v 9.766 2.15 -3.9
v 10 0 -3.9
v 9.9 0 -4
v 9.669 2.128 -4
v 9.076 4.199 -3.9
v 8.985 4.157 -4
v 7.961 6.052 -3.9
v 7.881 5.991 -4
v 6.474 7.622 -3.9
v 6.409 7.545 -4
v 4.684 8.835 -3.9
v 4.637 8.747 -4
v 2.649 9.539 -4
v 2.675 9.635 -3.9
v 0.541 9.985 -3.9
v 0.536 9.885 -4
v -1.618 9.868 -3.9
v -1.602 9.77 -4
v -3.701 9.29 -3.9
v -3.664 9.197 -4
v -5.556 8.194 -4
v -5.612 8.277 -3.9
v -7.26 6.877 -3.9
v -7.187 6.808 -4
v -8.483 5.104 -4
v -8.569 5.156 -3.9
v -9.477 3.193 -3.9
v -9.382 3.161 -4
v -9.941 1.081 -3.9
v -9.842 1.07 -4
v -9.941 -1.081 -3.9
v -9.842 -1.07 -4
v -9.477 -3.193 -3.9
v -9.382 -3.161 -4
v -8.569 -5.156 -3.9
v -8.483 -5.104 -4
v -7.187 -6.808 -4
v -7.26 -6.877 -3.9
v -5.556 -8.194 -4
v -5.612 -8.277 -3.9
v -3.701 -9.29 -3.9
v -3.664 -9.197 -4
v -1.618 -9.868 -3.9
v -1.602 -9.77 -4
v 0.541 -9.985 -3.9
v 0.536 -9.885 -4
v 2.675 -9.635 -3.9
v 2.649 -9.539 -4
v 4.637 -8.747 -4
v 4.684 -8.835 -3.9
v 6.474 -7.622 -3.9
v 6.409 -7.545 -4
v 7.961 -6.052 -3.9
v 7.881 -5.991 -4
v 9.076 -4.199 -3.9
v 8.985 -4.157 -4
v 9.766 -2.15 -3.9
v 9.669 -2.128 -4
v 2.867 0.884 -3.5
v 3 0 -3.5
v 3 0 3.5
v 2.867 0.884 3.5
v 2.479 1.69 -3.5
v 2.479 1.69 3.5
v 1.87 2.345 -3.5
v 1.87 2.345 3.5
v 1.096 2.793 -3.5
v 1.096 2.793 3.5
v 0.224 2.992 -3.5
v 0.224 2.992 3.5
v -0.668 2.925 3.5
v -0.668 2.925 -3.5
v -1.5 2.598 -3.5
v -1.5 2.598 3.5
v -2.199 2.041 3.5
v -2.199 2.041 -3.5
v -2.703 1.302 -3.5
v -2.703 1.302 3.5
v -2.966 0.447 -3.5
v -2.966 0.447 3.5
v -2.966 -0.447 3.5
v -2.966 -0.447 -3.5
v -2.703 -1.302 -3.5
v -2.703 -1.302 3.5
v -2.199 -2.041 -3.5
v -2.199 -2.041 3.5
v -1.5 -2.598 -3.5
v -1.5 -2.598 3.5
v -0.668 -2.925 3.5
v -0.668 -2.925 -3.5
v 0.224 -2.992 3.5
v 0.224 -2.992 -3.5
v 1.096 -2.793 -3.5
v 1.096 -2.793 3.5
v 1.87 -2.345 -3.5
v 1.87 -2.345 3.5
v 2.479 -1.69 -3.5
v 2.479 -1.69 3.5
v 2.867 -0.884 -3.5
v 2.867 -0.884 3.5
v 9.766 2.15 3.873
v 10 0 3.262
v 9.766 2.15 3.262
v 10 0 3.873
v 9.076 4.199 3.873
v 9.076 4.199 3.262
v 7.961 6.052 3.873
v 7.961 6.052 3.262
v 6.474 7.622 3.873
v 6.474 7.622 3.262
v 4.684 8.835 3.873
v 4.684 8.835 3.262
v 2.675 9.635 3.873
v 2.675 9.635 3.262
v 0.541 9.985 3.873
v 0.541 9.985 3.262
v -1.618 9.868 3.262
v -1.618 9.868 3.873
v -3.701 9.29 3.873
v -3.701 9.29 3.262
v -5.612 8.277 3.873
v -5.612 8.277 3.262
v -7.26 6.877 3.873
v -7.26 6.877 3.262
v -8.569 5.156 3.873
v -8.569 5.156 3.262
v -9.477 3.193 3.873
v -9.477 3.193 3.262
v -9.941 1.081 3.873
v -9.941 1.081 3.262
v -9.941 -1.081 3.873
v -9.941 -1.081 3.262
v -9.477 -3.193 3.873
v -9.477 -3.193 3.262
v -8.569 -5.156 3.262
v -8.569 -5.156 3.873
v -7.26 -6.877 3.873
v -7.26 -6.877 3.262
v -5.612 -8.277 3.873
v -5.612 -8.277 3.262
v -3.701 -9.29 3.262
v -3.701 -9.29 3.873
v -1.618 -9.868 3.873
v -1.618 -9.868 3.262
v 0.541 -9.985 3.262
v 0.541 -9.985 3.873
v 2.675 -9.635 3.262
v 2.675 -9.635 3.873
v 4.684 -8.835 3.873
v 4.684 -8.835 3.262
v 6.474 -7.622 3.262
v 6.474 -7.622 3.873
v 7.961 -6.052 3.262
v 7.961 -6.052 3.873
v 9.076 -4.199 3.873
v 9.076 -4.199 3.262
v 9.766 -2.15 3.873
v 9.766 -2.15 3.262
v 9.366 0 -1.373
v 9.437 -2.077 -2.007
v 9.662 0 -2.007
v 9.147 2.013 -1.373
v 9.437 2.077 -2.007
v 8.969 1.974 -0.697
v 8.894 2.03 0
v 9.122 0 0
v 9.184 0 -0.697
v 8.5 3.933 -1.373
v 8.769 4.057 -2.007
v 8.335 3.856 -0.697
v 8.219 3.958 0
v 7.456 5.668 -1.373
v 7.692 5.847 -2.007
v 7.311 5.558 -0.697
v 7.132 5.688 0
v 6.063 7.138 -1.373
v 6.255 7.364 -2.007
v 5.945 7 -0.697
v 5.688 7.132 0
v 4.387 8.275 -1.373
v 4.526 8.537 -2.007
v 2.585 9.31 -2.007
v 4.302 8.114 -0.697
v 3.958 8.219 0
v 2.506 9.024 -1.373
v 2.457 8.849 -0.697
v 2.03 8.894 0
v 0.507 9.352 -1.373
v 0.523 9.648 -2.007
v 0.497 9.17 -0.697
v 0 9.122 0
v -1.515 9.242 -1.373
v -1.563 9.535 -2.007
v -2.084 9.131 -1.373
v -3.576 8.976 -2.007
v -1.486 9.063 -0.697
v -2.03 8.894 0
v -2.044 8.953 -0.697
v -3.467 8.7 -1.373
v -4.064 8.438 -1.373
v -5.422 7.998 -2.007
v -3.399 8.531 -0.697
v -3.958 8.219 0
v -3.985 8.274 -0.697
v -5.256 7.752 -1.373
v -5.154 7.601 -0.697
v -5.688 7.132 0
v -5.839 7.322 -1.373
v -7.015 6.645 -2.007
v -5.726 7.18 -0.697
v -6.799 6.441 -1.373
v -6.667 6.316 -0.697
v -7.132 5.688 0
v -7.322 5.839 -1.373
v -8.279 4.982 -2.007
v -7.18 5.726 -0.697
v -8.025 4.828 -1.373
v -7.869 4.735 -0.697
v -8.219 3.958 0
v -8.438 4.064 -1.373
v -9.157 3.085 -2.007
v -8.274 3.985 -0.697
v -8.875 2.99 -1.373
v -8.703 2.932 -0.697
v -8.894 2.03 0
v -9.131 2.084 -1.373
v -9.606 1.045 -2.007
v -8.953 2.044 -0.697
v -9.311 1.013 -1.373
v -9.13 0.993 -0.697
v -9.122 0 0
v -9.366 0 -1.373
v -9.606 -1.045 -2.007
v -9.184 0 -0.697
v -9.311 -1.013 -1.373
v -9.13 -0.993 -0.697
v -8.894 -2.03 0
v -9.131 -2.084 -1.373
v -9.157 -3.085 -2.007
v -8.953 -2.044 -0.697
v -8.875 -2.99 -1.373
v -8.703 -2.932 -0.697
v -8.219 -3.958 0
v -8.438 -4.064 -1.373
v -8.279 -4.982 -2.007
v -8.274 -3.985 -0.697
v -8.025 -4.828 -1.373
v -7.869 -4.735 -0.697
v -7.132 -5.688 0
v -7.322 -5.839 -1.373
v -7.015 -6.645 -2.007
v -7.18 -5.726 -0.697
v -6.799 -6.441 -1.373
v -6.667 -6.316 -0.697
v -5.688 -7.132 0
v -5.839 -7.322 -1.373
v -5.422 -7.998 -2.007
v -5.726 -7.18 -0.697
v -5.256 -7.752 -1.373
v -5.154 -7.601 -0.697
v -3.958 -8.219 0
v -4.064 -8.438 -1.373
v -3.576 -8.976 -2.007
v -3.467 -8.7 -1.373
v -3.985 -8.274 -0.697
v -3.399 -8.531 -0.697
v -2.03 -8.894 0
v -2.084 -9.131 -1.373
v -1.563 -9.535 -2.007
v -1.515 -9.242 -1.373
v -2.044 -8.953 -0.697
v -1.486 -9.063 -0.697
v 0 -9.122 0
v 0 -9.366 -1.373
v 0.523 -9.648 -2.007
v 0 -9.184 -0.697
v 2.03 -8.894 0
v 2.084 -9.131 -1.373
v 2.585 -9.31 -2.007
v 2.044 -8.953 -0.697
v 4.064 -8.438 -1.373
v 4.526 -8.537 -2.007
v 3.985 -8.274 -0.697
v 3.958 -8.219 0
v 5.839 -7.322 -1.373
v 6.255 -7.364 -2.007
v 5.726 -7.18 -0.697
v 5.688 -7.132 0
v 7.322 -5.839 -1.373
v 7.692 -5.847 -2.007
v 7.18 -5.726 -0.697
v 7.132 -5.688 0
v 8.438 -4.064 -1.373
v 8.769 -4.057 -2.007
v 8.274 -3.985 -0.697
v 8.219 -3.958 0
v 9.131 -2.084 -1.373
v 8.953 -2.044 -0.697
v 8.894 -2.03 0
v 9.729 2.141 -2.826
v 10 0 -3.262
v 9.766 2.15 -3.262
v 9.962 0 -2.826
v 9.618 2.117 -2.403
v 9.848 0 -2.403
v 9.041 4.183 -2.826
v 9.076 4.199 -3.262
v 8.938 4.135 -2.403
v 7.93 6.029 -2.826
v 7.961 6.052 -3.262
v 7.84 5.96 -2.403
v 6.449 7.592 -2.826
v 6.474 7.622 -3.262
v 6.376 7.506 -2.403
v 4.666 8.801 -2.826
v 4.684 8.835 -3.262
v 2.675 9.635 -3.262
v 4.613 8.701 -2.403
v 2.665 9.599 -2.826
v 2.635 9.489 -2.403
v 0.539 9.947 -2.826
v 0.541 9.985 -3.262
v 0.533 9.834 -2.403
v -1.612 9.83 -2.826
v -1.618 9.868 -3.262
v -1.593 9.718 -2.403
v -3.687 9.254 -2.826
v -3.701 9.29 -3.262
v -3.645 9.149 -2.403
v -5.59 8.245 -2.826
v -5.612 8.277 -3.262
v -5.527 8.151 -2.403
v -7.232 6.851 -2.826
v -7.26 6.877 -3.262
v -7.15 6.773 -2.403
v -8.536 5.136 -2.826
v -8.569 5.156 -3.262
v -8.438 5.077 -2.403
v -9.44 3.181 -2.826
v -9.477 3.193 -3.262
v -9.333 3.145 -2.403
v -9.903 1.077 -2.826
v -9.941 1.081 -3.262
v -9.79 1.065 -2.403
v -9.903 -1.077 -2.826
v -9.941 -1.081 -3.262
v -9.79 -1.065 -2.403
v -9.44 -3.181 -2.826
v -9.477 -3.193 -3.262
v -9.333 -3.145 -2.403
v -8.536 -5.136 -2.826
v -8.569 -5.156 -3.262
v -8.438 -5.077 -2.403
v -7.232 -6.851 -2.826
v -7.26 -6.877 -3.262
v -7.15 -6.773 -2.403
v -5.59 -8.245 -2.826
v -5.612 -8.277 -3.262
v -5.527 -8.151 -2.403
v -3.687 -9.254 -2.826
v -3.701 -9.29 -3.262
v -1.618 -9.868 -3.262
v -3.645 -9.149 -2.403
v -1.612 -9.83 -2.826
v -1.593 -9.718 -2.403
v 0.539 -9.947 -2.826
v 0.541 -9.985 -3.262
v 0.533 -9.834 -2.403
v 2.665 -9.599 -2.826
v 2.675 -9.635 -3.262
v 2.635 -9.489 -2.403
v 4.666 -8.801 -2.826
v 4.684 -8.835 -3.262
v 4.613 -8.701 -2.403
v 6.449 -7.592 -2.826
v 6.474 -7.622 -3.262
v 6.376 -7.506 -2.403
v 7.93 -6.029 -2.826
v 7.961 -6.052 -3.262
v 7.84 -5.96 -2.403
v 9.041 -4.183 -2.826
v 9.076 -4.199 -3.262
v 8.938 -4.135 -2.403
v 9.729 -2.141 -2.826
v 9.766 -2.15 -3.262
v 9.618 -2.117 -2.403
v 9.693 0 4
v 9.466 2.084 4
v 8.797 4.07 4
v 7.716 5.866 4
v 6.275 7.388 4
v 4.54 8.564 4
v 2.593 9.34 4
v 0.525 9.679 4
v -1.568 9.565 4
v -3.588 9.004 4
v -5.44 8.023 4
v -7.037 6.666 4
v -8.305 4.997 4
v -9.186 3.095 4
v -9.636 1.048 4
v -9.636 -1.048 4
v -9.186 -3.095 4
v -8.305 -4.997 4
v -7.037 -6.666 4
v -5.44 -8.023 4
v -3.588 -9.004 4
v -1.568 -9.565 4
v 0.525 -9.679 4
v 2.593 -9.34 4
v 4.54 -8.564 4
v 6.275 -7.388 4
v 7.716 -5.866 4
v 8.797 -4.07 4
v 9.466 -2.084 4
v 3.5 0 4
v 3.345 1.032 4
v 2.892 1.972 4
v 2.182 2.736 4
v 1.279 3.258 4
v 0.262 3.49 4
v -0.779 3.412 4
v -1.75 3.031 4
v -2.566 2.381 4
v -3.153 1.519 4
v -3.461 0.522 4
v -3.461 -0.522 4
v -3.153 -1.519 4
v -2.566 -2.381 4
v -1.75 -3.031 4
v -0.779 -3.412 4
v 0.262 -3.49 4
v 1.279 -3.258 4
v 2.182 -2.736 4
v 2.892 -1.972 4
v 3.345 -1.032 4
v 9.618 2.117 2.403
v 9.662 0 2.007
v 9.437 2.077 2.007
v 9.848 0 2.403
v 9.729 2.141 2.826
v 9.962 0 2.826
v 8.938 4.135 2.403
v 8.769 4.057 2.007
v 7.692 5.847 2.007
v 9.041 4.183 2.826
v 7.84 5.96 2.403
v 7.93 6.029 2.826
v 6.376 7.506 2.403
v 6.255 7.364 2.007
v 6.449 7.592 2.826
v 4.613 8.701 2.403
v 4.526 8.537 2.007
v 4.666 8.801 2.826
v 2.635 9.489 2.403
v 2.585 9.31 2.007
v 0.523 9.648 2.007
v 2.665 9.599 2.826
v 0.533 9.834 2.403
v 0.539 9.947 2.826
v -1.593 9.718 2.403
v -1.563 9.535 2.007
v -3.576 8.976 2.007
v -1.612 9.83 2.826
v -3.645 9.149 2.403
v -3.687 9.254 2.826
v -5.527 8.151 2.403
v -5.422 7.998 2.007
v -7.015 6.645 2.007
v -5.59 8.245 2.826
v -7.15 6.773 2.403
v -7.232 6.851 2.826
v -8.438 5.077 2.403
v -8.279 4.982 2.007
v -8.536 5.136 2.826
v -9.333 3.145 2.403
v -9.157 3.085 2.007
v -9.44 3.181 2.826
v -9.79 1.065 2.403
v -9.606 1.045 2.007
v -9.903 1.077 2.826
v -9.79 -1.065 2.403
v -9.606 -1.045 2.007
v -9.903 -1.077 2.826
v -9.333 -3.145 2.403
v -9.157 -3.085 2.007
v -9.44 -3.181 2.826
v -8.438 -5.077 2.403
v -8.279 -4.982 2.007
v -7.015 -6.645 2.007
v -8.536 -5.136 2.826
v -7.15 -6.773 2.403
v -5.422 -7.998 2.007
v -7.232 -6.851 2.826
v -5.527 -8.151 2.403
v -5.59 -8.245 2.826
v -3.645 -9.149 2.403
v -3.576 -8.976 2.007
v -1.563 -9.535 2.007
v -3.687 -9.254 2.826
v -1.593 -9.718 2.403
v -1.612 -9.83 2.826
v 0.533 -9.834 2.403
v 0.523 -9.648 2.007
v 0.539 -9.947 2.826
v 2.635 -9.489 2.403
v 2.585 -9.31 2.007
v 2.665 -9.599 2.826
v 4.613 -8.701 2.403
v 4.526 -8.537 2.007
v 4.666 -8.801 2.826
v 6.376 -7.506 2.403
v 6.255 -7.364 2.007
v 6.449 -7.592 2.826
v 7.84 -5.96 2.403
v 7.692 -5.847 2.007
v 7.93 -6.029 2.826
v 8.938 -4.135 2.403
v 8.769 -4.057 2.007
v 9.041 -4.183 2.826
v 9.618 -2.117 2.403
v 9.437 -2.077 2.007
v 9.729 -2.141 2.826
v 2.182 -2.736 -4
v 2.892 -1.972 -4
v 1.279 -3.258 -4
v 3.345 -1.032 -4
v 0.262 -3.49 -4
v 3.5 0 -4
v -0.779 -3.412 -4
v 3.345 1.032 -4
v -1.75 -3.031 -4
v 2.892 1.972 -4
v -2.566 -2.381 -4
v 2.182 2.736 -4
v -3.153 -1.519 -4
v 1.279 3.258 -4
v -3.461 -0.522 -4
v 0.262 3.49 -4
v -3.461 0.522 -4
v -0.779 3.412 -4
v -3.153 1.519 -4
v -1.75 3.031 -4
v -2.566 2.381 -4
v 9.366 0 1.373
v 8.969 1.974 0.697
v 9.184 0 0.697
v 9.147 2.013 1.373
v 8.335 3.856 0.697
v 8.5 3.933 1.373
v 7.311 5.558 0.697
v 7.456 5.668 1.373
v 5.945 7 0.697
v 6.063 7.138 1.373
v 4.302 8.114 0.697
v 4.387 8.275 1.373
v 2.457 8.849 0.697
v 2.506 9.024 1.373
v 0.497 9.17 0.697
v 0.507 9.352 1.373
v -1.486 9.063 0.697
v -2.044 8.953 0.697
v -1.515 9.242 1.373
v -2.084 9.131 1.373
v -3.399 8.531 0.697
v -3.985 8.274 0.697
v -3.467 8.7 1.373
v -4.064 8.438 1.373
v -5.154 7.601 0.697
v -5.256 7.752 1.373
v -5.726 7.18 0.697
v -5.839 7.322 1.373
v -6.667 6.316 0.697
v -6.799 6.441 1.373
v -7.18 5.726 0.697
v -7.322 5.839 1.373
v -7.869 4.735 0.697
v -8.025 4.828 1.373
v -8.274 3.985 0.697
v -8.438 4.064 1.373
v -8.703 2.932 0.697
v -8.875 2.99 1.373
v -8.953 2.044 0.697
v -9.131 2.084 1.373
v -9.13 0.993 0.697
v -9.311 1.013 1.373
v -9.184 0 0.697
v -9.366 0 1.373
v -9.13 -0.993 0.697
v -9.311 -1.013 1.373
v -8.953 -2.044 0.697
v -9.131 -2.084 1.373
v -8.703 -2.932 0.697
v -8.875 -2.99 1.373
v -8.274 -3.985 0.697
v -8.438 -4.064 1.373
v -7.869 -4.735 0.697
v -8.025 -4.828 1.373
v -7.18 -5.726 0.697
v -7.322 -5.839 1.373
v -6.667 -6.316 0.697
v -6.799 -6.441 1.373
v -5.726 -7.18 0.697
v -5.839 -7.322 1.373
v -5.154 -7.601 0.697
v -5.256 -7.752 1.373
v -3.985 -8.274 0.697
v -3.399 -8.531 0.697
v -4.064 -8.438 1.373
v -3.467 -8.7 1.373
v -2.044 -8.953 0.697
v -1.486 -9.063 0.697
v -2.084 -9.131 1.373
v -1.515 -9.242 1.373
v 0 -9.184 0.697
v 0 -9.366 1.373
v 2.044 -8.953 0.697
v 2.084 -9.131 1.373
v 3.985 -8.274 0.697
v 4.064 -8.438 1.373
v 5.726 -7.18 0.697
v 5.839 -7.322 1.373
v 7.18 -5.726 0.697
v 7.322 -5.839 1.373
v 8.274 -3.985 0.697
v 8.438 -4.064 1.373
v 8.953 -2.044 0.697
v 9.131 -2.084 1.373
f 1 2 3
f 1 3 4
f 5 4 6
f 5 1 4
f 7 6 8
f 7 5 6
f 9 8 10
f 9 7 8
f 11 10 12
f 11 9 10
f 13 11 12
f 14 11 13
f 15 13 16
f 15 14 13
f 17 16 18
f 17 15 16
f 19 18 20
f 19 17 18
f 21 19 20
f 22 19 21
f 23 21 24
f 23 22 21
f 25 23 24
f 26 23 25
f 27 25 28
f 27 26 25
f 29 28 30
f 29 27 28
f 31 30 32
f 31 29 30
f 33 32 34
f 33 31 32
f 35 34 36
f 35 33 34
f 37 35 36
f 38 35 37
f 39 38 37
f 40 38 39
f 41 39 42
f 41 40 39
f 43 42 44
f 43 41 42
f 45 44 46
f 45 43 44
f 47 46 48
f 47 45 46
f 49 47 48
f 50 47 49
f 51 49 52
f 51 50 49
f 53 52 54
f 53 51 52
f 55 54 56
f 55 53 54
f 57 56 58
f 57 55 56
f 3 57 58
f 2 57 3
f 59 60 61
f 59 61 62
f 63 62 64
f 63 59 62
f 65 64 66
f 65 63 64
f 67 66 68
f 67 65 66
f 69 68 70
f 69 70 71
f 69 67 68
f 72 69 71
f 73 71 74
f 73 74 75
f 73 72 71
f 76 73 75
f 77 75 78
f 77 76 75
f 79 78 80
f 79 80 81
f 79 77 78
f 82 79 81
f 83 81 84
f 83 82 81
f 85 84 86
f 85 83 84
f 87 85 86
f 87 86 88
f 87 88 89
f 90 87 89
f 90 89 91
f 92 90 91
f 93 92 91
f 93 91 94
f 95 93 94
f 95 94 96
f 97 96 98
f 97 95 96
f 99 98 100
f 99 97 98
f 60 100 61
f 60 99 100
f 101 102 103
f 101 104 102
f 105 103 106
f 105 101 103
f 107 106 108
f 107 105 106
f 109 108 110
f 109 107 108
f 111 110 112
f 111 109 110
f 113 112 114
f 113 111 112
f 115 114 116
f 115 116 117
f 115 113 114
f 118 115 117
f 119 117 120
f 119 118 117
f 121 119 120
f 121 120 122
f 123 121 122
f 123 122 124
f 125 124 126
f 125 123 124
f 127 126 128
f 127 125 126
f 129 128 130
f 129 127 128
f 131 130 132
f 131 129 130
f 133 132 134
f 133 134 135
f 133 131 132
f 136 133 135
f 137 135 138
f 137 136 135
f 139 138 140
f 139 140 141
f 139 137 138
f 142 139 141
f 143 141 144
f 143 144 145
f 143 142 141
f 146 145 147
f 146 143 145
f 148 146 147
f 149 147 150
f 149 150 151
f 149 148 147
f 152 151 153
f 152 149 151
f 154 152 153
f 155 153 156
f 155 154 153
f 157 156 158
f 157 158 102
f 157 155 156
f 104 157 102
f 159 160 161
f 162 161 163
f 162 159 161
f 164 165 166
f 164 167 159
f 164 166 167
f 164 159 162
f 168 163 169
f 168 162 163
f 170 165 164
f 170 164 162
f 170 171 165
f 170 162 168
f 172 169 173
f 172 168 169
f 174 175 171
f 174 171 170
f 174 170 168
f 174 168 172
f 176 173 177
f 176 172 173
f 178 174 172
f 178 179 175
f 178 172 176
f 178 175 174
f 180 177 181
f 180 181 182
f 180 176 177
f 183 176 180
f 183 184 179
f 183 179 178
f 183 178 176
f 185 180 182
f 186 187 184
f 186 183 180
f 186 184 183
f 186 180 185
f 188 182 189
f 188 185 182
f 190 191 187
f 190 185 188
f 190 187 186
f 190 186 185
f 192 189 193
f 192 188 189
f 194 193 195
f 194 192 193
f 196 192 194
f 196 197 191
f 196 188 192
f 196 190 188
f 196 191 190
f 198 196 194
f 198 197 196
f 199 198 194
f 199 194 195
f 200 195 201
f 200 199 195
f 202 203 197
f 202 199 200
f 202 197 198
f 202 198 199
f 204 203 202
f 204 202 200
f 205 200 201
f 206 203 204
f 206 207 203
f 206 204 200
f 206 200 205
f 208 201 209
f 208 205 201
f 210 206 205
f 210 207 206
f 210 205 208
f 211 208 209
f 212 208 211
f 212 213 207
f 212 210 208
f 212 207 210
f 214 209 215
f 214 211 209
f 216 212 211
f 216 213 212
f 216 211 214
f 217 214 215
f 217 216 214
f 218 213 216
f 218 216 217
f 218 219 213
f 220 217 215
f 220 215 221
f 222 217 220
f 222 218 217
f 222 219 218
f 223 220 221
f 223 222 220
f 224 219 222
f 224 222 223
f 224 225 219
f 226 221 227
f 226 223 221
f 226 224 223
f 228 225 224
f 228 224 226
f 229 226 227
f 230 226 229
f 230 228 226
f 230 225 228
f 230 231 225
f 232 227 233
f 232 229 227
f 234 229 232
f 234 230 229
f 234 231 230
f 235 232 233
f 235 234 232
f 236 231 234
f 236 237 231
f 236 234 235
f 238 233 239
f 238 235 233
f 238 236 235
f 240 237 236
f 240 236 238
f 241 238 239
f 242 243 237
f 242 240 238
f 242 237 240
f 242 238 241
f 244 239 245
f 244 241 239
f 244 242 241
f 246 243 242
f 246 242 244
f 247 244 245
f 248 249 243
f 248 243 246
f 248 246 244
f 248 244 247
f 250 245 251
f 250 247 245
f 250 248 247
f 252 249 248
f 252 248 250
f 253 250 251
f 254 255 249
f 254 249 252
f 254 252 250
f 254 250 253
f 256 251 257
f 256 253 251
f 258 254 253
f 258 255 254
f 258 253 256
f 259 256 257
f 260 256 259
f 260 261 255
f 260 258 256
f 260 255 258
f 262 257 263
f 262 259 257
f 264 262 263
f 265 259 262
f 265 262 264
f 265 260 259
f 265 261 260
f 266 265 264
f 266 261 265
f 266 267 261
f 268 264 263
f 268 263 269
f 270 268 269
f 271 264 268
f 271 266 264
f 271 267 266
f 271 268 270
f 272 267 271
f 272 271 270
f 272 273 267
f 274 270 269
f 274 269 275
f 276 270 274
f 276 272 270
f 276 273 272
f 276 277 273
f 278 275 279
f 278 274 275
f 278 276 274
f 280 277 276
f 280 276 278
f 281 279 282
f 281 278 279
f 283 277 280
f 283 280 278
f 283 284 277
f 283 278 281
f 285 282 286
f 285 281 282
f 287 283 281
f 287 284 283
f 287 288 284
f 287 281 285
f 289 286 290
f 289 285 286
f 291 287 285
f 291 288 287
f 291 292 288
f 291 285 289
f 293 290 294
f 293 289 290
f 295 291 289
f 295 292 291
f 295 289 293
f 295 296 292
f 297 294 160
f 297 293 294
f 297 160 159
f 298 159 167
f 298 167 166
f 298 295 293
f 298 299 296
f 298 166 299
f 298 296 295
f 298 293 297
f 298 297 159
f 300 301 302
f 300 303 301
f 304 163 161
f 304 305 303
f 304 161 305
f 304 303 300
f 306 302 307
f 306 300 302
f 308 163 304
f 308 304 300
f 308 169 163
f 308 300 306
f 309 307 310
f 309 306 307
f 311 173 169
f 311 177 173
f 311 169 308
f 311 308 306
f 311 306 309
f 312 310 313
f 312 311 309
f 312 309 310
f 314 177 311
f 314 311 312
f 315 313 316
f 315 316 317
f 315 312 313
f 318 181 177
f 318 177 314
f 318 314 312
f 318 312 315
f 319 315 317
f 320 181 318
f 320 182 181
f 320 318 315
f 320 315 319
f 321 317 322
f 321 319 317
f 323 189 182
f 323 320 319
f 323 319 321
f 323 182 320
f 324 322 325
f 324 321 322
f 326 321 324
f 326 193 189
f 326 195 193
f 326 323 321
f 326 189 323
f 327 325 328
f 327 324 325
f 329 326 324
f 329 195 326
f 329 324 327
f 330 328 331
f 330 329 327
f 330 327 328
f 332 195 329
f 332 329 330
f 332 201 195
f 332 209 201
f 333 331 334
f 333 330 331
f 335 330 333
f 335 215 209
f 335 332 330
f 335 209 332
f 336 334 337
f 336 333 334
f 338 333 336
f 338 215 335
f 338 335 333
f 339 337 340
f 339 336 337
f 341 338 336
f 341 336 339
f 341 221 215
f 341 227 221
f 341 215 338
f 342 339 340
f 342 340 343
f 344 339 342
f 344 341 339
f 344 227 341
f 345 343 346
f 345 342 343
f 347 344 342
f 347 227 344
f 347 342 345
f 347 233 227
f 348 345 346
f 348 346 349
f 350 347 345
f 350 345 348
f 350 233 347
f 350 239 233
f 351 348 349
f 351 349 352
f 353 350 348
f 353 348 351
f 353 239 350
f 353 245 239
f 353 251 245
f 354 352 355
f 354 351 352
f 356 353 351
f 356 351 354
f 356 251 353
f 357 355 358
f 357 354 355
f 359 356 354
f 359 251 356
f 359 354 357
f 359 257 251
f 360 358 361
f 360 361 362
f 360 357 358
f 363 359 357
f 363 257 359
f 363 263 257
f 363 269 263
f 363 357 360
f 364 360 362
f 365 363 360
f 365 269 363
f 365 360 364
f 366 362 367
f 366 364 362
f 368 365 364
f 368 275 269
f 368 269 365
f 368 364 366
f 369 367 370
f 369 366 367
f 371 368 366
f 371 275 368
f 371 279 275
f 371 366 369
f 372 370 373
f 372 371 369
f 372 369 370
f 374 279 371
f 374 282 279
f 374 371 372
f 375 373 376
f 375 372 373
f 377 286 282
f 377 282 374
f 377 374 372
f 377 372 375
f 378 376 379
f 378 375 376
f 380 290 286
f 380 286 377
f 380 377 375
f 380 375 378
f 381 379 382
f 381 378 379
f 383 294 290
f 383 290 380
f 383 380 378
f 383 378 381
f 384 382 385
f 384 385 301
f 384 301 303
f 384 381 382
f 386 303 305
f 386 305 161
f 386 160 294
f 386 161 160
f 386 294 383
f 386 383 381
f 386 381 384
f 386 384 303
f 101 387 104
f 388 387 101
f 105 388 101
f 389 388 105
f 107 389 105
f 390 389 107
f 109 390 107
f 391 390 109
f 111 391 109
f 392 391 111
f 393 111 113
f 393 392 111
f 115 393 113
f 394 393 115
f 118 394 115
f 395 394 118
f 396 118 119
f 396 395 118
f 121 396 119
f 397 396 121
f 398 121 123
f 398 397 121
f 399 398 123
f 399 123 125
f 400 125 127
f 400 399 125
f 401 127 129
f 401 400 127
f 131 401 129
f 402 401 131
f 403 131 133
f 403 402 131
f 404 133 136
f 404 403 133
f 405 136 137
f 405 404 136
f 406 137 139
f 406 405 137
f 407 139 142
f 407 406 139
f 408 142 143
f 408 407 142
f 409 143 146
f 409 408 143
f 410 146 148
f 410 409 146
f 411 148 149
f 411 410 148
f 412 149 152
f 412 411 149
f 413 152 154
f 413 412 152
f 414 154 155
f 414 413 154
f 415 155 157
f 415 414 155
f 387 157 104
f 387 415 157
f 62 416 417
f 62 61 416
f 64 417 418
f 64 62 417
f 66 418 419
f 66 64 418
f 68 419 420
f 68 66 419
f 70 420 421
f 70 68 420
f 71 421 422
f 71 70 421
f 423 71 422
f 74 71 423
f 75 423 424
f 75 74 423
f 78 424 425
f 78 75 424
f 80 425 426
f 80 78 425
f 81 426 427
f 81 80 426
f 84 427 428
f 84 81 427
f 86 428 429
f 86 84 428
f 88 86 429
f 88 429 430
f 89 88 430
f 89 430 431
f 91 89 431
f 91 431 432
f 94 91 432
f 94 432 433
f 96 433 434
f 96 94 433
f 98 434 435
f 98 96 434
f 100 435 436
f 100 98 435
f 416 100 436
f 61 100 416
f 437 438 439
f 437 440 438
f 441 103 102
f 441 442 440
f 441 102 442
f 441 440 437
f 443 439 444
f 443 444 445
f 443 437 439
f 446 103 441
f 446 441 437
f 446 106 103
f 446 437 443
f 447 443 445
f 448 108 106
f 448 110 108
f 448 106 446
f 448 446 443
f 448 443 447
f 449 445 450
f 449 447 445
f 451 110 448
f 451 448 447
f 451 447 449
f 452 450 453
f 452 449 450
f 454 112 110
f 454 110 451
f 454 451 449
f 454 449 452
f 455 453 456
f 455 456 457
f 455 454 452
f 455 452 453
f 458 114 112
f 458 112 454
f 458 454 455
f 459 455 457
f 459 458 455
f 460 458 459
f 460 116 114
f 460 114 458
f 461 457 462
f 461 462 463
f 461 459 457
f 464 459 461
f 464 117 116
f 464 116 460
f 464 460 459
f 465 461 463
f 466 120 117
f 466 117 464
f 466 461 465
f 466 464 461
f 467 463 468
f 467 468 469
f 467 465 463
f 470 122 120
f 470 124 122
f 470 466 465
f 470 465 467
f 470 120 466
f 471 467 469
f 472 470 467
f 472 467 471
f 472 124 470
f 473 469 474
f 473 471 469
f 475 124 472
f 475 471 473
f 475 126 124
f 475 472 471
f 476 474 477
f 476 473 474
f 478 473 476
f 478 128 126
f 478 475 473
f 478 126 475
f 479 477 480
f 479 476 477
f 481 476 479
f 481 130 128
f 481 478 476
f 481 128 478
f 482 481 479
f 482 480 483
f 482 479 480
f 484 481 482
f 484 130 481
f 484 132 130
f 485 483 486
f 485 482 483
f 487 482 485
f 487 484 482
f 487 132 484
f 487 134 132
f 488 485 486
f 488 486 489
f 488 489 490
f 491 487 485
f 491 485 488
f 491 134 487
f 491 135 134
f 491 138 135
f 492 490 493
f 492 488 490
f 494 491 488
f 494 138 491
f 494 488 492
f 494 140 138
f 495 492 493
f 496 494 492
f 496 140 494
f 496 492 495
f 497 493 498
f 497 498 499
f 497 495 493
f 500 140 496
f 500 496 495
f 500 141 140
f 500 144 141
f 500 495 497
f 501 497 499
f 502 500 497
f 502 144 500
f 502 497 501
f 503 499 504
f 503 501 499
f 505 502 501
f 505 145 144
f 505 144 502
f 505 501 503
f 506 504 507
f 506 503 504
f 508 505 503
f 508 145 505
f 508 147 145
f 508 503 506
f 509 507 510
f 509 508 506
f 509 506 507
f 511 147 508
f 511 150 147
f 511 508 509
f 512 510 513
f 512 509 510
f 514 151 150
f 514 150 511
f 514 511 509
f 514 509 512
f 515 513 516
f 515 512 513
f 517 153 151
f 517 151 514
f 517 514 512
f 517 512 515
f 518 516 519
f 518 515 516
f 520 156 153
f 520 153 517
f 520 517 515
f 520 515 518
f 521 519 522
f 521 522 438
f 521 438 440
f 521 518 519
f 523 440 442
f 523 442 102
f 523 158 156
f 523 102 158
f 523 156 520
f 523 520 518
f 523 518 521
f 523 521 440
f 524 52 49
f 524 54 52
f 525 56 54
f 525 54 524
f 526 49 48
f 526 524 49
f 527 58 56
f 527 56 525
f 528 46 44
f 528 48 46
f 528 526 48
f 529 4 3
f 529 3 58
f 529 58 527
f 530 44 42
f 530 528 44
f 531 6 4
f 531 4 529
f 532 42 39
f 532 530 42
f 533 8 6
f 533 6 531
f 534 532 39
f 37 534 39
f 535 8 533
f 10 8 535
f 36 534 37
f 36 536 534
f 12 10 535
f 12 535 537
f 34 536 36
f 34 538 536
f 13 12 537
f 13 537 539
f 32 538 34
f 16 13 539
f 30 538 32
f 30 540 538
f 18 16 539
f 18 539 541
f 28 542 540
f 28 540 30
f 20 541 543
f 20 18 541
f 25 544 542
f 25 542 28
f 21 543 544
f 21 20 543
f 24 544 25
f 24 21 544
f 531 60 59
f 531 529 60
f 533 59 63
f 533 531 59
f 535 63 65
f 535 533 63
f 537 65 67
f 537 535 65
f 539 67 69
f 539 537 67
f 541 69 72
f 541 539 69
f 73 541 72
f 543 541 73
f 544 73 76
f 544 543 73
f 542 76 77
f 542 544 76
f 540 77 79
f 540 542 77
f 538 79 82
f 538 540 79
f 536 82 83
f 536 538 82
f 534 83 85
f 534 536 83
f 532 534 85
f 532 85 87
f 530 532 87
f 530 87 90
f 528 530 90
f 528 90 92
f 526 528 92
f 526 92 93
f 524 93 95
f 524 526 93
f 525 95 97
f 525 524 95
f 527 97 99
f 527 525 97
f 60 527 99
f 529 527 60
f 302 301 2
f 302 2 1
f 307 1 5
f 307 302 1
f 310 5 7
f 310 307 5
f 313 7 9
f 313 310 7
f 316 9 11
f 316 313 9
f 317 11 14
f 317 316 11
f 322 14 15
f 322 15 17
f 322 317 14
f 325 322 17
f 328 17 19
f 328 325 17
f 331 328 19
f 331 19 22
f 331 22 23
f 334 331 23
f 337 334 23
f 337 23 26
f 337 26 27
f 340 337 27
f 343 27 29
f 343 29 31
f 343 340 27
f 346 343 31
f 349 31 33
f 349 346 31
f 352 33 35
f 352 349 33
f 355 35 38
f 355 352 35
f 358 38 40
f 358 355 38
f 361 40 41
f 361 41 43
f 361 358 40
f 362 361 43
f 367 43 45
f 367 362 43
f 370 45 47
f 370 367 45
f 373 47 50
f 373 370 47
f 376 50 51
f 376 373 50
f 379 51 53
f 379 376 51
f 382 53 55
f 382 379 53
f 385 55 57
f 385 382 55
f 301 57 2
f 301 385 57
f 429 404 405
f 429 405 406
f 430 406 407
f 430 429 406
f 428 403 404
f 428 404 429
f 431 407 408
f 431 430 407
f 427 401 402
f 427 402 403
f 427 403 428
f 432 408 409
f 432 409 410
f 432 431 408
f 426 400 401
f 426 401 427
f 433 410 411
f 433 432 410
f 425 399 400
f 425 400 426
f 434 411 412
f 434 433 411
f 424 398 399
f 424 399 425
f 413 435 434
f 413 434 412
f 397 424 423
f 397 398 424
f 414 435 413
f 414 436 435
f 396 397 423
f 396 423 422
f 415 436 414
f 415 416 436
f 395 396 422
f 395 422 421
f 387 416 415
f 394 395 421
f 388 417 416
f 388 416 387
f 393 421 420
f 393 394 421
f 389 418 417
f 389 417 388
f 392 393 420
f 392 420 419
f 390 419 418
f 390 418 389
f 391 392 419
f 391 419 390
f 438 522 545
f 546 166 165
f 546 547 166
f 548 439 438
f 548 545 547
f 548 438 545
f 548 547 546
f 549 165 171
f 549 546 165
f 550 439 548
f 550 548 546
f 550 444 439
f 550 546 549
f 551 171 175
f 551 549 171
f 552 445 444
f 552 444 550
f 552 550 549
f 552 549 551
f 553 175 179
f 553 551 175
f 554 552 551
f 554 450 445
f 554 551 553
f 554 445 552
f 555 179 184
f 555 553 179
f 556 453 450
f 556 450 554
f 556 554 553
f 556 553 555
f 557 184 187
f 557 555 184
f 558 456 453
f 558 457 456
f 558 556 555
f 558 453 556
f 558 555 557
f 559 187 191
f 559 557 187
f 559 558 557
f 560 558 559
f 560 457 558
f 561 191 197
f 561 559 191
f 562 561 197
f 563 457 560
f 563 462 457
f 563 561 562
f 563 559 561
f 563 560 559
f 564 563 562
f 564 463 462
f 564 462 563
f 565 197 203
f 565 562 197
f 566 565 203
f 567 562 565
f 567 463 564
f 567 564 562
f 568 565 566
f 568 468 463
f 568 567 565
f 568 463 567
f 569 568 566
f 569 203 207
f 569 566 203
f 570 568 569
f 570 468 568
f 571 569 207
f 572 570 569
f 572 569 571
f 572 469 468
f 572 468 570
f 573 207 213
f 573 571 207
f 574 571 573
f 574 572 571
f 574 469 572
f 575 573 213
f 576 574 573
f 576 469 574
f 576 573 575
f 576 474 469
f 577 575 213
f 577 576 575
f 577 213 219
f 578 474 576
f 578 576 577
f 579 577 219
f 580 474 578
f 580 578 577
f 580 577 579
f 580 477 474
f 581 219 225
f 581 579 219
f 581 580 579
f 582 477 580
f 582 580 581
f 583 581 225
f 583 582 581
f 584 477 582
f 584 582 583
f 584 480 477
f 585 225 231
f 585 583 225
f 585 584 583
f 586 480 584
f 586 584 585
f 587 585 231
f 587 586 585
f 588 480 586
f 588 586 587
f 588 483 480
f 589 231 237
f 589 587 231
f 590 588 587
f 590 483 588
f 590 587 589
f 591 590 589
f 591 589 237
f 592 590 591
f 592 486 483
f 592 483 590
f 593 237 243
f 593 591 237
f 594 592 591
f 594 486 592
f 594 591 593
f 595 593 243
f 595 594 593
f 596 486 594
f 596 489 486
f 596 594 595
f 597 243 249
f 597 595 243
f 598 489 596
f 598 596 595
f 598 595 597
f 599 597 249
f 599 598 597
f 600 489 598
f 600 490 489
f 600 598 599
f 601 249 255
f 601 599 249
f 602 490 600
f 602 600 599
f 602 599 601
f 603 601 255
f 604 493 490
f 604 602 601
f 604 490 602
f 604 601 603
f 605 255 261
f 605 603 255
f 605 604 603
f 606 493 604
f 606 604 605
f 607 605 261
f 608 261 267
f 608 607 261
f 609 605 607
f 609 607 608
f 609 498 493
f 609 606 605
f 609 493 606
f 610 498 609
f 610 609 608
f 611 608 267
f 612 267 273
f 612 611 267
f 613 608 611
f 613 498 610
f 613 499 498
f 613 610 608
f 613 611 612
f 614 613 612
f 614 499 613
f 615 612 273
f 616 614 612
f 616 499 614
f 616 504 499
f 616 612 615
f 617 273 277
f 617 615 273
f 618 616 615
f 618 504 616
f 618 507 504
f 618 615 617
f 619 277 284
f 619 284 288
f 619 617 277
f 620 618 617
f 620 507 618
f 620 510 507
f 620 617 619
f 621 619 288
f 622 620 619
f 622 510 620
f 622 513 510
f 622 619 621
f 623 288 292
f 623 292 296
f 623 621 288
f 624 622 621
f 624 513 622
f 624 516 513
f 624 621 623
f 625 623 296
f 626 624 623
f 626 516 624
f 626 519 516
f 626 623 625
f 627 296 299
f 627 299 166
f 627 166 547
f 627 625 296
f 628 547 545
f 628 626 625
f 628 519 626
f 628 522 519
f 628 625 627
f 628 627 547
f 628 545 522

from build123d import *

# Parameters (mm, degrees)
F2_SIZE = 0.1


# Not quite as in the source:
# - a fillet or chamfer that OpenCascade refuses, or shapes differently, is made with other operations: its cross-section is extruded or revolved along the edge and cut away or added


with BuildPart() as f1:
    # F0 (on Front) → F1 (revolve)
    with BuildSketch(Plane.XZ):
        with BuildLine():
            Line((10, 4), (3, 4))
            Line((3, 4), (3, 0))
            Line((3, 0), (3, -4))
            Line((3, -4), (10, -4))
            Line((10, -4), (10, -3.2615188186))
            ThreePointArc((10, -3.2615188186), (9.9141508898, -2.6119993954), (9.6624996151, -2.0070885037))
            ThreePointArc((9.6624996151, -2.0070885037), (9.2598575755, -1.0392310772), (9.1224989992, 0))
            ThreePointArc((9.1224989992, 0), (9.2598575755, 1.0392310772), (9.6624996151, 2.0070885037))
            ThreePointArc((9.6624996151, 2.0070885037), (9.9141508898, 2.6119993954), (10, 3.2615188186))
            Line((10, 3.2615188186), (10, 4))
        make_face()
    revolve(axis=Axis((0, 0, 5.2388195913), (0, 0, 1)))

    # F2
    f2_edges = [f1.edges().sort_by_distance(p)[0] for p in [
        (-10, 0, 4),
        (-10, 0, -4),
    ]]
    chamfer(f2_edges, length=F2_SIZE)

    # F3: chamfer of 0.5 on 3 edges, made by hand

    # F3_s1 → F3_t2 (revolve, cut)
    with BuildSketch(Plane.XZ):
        Polygon((3.5, 4), (3, 3.5), (3, 4), align=None)
    revolve(axis=Axis((0, 0, 4), (0, 0, 1)), mode=Mode.SUBTRACT)

    # F3_s3 → F3_t4 (revolve, cut)
    with BuildSketch(Plane.XZ):
        Polygon((3, -3.5), (3.5, -4), (3, -4), align=None)
    revolve(axis=Axis((0, 0, -4), (0, 0, 1)), mode=Mode.SUBTRACT)

    # F3_s5 → F3_t6 (revolve, cut)
    with BuildSketch(Plane.XZ):
        Polygon((10.0464466094, 3.8535533906), (9.6928932188, 4), (9.9, 4), align=None)
    revolve(axis=Axis((0, 0, 4), (0, 0, 1)), mode=Mode.SUBTRACT)


solid = f1.part
